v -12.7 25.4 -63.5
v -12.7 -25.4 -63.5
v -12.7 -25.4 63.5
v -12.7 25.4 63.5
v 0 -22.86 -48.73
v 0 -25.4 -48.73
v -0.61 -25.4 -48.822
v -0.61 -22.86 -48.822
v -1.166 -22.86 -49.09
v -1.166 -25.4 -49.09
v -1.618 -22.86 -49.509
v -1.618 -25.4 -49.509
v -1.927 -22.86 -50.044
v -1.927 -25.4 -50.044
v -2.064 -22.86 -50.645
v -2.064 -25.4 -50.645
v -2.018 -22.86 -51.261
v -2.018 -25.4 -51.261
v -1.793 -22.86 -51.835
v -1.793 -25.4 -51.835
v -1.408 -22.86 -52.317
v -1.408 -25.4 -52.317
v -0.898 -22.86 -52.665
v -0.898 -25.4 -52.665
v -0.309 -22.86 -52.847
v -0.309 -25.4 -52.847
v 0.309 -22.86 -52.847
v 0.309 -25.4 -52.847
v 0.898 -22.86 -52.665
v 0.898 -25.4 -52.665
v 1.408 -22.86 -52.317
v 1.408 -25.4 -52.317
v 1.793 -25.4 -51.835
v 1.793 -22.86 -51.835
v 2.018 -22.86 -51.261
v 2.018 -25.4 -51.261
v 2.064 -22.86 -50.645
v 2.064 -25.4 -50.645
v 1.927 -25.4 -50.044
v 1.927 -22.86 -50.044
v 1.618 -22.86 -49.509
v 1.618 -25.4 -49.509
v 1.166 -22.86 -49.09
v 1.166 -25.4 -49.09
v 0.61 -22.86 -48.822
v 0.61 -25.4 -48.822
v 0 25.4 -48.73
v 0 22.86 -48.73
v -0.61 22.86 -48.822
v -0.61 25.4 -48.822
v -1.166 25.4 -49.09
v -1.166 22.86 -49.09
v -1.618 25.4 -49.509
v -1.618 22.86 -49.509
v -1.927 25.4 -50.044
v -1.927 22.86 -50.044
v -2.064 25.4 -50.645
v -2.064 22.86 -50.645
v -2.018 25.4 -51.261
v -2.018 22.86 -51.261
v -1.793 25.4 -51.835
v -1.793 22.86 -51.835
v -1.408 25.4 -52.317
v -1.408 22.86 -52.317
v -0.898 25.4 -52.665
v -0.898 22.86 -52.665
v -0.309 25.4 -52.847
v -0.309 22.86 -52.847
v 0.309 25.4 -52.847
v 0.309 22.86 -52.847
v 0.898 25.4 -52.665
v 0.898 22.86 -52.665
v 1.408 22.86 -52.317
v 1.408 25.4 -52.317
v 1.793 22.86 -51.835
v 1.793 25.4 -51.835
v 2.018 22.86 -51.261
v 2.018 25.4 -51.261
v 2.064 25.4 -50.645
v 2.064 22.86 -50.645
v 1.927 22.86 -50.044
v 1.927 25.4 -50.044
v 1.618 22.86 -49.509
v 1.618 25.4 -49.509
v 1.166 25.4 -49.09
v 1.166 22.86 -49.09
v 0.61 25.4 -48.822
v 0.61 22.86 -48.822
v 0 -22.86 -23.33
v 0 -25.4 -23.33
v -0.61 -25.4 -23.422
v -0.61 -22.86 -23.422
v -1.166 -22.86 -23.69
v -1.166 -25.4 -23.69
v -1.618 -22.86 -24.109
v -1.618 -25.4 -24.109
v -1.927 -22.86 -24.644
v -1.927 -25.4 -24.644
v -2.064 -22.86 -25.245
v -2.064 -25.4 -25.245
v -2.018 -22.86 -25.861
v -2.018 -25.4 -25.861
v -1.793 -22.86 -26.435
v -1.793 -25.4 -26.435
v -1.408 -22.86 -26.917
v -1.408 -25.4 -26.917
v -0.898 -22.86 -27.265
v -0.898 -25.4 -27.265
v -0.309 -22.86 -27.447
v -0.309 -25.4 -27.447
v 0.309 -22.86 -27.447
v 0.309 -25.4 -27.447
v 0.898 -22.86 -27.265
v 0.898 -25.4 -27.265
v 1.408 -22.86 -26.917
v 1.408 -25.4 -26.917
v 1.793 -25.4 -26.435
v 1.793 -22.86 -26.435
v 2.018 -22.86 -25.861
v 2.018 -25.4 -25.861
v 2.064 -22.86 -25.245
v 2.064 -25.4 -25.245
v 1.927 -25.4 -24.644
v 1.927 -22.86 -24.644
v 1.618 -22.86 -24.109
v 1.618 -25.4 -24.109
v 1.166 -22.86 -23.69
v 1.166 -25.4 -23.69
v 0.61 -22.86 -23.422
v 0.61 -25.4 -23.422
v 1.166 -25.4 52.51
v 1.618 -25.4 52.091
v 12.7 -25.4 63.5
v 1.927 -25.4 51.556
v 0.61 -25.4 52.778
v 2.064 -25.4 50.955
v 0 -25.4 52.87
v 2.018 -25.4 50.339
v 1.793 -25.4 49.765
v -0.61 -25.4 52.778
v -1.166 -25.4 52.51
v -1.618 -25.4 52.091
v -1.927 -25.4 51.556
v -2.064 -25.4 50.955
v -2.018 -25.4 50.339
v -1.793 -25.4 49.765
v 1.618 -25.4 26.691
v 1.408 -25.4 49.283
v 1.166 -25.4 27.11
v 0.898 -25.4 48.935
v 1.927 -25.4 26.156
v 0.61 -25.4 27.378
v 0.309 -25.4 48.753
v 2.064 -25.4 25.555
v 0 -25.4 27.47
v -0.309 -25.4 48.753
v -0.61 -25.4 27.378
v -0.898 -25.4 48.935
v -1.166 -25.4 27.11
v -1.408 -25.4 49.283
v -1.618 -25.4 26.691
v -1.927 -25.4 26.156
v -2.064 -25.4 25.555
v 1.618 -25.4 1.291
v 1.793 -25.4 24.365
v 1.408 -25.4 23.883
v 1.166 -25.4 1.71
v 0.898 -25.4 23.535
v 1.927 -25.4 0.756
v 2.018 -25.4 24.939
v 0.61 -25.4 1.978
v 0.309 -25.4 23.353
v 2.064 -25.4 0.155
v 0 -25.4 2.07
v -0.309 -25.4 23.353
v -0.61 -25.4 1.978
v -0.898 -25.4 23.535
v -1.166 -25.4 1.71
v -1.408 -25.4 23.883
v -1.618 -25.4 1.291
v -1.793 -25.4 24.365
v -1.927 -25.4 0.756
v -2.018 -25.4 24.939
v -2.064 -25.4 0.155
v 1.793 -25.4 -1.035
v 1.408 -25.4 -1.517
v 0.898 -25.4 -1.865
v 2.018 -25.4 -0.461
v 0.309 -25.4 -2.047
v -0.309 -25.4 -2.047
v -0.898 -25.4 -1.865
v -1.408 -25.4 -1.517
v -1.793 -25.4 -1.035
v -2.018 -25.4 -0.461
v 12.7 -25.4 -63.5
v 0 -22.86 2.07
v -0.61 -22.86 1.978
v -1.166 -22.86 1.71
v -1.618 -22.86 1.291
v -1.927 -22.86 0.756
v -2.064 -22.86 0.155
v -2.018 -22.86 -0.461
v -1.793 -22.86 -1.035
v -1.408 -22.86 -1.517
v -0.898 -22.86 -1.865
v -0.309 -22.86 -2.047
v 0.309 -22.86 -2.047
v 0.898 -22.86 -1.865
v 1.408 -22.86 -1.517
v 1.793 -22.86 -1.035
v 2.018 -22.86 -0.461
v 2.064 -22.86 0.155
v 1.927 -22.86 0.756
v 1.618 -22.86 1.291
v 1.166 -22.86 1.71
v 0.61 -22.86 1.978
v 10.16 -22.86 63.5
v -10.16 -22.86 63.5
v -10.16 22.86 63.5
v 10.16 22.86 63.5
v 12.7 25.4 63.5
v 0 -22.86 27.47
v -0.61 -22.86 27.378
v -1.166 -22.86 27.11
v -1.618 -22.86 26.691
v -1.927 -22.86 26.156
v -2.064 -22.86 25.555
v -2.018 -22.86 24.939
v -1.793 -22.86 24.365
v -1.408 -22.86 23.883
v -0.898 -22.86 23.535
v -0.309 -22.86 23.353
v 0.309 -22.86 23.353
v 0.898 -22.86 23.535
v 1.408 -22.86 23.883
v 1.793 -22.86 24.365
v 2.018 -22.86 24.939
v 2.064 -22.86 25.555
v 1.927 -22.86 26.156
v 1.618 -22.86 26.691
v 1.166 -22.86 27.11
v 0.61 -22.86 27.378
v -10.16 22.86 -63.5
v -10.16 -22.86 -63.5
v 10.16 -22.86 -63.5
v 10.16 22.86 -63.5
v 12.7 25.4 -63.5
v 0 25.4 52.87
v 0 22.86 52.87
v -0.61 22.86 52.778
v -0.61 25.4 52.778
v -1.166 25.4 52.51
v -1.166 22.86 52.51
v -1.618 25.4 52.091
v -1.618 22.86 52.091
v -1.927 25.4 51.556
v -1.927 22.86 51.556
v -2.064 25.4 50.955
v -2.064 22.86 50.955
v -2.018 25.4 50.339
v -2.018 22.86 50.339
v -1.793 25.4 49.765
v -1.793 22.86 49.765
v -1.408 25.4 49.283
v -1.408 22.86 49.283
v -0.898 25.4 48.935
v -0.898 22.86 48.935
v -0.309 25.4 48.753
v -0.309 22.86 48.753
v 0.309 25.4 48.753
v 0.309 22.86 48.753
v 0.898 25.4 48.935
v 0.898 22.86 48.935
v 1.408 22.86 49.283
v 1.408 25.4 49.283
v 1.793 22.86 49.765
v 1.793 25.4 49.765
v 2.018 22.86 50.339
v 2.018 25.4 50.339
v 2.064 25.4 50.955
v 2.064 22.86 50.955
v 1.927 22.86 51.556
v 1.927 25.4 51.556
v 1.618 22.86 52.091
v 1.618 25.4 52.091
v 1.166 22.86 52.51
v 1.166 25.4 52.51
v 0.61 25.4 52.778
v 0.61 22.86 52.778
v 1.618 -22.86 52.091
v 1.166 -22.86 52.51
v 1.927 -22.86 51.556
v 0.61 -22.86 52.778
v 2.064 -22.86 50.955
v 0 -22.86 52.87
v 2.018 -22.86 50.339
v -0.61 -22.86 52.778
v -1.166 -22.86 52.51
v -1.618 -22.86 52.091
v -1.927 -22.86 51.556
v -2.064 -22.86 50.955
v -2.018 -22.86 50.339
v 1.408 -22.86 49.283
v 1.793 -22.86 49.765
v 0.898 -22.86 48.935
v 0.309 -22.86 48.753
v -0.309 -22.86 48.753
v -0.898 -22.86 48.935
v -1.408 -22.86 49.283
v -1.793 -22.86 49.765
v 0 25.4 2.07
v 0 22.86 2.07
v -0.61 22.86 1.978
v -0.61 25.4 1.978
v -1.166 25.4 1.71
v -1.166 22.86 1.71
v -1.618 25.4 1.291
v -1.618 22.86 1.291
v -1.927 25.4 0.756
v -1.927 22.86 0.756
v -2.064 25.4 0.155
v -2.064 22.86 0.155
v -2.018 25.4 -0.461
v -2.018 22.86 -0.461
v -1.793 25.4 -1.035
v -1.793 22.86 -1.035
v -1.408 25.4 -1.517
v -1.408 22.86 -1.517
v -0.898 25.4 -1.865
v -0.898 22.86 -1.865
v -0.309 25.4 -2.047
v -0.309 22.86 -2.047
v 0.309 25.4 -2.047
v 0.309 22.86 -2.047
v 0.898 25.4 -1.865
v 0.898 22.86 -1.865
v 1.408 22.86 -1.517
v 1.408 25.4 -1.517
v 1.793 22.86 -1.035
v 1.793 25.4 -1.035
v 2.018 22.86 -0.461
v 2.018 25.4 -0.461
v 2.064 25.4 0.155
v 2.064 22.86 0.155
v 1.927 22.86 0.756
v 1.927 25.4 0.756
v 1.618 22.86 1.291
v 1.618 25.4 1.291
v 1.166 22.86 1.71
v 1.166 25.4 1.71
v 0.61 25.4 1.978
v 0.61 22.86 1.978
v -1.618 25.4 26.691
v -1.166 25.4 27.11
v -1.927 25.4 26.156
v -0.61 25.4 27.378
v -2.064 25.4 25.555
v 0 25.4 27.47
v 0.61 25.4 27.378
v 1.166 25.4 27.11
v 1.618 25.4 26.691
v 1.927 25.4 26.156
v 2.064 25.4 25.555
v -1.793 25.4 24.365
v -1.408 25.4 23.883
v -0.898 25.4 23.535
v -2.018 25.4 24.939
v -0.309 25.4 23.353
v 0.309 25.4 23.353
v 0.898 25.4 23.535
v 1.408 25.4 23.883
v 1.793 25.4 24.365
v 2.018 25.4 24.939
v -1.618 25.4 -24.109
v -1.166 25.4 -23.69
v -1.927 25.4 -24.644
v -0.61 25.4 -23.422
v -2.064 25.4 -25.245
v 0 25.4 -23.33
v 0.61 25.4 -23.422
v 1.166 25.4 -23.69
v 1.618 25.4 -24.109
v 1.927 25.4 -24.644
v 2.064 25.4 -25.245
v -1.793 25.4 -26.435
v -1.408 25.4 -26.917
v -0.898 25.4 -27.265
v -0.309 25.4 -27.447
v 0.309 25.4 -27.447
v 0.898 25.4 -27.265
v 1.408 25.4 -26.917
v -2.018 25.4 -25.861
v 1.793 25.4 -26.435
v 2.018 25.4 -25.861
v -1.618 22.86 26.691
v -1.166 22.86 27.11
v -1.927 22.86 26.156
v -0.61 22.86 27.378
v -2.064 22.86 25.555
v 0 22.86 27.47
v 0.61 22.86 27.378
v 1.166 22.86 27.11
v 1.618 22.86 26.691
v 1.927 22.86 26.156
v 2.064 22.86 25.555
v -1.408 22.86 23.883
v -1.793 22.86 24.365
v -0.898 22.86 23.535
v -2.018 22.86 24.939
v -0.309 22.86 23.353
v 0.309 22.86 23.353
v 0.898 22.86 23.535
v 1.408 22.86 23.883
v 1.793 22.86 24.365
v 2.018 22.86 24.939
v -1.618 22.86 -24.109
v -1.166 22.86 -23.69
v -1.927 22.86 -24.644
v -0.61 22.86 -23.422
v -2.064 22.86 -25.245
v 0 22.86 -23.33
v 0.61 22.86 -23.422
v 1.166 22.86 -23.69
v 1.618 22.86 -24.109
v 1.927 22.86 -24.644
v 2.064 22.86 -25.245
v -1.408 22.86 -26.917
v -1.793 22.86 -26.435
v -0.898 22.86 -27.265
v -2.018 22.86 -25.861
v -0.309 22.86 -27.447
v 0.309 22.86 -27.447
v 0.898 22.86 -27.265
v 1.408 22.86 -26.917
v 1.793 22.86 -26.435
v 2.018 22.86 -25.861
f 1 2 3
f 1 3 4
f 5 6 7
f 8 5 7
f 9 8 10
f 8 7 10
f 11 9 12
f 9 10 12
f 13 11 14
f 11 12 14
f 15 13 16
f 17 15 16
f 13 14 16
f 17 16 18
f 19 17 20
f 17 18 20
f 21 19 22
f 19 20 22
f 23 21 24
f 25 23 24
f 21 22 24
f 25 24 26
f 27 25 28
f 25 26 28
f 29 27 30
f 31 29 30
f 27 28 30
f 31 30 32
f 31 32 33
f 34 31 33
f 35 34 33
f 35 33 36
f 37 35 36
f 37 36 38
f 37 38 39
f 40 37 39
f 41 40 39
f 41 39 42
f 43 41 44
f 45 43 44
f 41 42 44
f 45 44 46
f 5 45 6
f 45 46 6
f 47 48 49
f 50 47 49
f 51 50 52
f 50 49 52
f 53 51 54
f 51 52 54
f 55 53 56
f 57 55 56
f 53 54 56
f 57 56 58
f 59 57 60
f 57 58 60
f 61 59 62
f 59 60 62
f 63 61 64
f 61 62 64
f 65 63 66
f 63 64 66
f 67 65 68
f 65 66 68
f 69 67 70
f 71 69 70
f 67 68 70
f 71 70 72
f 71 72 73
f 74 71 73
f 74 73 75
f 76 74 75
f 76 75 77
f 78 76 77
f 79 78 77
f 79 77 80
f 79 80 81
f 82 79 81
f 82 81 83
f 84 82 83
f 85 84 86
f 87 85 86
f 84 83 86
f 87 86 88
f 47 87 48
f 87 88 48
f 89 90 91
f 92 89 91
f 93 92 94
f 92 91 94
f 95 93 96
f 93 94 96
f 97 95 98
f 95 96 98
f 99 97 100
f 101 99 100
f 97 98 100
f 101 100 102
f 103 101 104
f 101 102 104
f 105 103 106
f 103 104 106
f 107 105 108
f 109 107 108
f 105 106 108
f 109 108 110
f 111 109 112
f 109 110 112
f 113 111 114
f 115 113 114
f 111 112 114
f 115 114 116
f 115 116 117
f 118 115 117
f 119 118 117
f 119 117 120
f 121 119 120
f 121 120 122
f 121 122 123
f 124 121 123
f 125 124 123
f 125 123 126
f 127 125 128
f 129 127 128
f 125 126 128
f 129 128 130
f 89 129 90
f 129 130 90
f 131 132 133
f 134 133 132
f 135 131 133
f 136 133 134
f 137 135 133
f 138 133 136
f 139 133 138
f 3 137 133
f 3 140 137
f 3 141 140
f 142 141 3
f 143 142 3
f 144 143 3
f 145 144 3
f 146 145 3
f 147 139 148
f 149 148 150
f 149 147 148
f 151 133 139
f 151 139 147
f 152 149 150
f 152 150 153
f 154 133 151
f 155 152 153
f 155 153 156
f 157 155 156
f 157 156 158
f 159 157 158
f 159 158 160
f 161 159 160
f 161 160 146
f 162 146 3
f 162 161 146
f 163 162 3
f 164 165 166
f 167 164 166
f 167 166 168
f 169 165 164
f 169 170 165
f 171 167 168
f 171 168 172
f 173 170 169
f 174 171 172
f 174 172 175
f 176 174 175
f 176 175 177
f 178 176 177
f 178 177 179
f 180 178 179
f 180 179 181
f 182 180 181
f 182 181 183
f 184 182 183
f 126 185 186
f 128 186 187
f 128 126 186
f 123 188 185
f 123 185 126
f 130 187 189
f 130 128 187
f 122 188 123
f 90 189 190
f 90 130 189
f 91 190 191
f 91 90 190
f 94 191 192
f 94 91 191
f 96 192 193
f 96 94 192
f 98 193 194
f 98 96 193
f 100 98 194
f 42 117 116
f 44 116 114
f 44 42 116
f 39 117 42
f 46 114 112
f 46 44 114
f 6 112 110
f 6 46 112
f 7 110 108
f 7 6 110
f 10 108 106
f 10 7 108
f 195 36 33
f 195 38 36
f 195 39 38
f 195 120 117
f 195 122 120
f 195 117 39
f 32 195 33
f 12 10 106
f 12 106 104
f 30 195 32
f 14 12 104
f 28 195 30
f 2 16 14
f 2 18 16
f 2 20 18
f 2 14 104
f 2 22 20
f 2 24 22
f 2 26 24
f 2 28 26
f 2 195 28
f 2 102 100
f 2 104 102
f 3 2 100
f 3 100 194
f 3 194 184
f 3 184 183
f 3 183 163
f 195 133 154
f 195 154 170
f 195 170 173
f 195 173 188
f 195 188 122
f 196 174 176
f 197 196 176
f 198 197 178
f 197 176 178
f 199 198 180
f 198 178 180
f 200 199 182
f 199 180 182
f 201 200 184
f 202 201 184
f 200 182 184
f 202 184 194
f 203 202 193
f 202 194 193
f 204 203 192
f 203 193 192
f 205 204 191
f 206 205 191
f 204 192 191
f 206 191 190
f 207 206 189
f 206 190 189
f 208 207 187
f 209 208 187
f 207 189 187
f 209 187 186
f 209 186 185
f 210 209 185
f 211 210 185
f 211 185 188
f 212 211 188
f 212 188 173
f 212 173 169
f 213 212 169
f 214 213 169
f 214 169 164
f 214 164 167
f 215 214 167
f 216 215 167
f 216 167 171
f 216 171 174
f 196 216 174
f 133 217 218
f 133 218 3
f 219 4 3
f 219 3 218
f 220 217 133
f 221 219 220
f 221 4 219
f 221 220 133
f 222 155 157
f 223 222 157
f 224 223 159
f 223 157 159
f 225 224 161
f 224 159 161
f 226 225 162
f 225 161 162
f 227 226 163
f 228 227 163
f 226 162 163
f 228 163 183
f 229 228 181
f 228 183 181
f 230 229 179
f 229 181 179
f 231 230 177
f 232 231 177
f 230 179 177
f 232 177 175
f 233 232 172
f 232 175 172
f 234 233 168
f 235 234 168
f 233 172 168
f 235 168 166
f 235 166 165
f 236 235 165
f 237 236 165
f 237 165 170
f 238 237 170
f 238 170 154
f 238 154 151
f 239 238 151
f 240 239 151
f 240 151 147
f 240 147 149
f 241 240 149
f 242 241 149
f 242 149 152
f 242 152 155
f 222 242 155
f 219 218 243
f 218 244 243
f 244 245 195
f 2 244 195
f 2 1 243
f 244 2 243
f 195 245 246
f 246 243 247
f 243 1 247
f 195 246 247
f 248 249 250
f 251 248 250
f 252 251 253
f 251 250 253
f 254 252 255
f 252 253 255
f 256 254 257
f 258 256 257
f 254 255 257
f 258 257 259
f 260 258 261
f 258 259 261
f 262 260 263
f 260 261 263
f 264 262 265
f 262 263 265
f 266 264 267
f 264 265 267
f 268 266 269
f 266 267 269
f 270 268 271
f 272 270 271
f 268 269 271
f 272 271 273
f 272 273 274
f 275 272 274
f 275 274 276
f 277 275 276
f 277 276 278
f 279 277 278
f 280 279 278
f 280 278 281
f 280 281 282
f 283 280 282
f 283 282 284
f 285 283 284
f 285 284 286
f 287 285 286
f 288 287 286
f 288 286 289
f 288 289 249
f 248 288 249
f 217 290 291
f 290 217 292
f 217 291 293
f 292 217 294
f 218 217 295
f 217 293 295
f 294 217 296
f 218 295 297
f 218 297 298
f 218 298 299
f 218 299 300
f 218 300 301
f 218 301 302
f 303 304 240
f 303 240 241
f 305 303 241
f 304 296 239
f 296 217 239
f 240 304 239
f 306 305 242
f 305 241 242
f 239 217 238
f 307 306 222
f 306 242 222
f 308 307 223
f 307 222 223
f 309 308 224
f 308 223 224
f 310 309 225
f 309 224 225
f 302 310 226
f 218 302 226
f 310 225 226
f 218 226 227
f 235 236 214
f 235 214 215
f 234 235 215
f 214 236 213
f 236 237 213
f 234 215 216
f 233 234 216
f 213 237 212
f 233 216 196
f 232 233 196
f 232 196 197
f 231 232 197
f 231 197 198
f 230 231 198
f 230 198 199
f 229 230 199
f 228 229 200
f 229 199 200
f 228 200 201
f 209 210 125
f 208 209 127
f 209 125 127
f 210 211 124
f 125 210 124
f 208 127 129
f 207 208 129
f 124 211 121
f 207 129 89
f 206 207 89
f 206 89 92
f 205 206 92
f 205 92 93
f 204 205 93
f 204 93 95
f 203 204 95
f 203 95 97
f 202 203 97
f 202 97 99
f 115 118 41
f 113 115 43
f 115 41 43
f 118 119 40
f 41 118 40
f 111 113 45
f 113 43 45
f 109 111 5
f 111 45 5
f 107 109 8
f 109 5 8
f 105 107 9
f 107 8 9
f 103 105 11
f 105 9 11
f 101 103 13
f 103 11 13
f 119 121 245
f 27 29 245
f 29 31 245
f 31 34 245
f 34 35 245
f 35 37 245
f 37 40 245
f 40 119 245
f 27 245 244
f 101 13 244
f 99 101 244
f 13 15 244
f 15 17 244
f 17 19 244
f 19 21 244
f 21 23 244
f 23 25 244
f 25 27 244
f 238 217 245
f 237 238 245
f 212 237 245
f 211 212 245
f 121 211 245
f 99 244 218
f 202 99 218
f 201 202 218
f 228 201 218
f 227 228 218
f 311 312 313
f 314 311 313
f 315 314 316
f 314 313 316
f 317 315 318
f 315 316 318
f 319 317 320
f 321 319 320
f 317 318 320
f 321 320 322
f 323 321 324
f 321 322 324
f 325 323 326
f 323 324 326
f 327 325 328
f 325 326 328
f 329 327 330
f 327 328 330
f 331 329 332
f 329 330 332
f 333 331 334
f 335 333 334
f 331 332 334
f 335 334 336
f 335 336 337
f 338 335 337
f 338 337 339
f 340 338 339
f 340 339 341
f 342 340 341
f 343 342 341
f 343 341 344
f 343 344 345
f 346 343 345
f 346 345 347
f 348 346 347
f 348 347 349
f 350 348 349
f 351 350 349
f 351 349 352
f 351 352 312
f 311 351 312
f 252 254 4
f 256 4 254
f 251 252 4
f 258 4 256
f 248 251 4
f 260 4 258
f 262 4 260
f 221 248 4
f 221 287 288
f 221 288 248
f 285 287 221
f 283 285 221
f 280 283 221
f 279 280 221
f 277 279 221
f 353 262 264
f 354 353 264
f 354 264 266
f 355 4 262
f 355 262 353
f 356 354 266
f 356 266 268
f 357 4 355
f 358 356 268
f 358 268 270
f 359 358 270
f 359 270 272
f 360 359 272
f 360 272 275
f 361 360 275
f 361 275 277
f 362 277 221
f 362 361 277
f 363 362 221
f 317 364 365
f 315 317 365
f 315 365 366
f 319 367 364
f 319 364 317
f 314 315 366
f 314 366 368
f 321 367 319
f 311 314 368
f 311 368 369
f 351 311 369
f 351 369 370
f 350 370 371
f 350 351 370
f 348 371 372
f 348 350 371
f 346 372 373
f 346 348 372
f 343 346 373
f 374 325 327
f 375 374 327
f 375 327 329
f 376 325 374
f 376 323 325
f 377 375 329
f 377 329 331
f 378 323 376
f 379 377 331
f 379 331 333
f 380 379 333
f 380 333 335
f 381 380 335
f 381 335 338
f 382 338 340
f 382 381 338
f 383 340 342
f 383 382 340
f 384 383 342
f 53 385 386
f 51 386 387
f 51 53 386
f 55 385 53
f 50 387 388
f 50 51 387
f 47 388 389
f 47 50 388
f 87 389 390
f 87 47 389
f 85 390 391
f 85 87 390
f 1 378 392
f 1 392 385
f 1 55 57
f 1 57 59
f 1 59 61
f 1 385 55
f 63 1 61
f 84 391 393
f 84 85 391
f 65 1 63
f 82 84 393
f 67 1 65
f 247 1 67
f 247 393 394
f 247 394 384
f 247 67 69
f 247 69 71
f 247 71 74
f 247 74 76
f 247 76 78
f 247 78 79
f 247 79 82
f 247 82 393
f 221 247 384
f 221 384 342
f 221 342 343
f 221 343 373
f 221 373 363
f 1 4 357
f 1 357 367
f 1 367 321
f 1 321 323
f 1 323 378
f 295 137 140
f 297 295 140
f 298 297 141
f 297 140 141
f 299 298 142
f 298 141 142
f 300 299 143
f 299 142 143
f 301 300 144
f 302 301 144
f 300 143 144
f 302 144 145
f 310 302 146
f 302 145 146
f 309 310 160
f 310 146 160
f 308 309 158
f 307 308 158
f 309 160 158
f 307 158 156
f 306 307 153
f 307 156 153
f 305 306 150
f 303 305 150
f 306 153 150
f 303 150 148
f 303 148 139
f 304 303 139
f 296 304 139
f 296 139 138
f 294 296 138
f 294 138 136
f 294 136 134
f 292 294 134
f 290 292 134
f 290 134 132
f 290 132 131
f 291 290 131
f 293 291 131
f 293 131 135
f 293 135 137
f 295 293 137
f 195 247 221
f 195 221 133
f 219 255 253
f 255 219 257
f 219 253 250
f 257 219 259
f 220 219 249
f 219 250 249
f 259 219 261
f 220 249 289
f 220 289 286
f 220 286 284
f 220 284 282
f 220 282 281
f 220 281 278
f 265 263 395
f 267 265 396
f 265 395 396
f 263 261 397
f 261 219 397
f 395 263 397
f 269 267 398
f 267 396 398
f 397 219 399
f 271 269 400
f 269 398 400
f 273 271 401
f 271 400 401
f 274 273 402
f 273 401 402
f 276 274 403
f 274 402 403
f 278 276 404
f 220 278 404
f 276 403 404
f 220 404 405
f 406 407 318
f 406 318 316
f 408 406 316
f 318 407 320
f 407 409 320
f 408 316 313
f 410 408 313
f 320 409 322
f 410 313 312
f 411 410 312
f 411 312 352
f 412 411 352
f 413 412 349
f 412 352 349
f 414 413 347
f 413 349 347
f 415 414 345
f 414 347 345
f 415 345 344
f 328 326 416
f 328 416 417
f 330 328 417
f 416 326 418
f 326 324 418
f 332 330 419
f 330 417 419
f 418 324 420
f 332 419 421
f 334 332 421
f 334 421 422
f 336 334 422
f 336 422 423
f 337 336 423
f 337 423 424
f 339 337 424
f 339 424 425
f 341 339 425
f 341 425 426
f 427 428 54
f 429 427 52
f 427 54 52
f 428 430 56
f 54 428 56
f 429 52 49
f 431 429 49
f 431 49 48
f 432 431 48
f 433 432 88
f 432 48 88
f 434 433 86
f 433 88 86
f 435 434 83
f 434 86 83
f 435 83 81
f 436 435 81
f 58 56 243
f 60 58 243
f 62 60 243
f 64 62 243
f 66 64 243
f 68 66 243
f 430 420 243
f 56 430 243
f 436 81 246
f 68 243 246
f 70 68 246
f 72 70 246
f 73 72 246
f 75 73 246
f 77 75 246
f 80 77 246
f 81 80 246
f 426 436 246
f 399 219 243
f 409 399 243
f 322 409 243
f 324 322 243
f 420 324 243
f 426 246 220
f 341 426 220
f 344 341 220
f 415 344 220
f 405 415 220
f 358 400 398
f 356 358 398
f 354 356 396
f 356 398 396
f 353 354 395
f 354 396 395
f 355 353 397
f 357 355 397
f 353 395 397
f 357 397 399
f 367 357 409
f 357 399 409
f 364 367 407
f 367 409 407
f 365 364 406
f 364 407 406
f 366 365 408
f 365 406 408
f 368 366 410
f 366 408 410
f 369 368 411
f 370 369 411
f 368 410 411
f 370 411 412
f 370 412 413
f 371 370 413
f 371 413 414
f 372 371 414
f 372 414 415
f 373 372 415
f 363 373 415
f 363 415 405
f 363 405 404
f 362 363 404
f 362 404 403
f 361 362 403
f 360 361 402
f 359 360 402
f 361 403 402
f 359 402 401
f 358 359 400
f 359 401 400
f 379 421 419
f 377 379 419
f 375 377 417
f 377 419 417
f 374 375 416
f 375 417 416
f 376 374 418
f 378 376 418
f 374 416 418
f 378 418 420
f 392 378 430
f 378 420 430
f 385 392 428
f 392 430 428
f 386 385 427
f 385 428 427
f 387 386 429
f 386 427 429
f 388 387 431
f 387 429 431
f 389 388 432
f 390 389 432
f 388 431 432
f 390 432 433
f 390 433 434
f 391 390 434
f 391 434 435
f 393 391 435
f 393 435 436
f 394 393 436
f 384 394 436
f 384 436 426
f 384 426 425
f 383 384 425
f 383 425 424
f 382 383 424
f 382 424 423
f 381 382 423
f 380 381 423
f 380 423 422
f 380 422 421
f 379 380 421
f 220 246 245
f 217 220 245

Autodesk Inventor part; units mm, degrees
ref_plane "YZ Plane" through (0, 0, 0) normal (1, 0, 0) x (0, 1, 0)
ref_plane "XZ Plane" through (0, 0, 0) normal (0, 1, 0) x (-1, 0, 0)
ref_plane "XY Plane" through (0, 0, 0) normal (0, 0, 1) x (1, 0, 0)
sketch "Sketch1" plane through (0, 0, 0) normal (0, 0, 1) x (1, 0, 0)
  line L0 (12.7, -25.4) -> (-12.7, -25.4)
  line L1 (-12.7, -25.4) -> (-12.7, 25.4)
  line L2 (-12.7, 25.4) -> (12.7, 25.4)
  line L3 (12.7, 25.4) -> (12.7, -25.4)
  line L4 (12.7, -25.4) -> (-12.7, 25.4) construction
  line L5 (-12.7, -25.4) -> (12.7, 25.4) construction
  line L6 (10.16, -22.86) -> (-10.16, -22.86)
  line L7 (-10.16, -22.86) -> (-10.16, 22.86)
  line L8 (-10.16, 22.86) -> (10.16, 22.86)
  line L9 (10.16, 22.86) -> (10.16, -22.86)
  line L10 (10.16, -22.86) -> (-10.16, 22.86) construction
  line L11 (-10.16, -22.86) -> (10.16, 22.86) construction
  point P0 (0, 0)
  dimension "d0" = 25.4
  dimension "d1" = 50.8
  dimension "d2" = 20.32
  dimension "d3" = 45.72
extrude "Extrusion1" add sketch "Sketch1" along normal mid plane 127
sketch "Sketch2" plane through (-12.7, 25.4, 63.5) normal (0, 1, 0) x (1, 0, 0)
  line L0 (0, 0) -> (0, 127) projected
  line L1 (25.4, 0) -> (0, 0) projected
  point P0 (12.7, 63.5)
  point P1 (12.7, 12.7)
  dimension "d6" = 12.7
  dimension "d7" = 12.7
hole "Hole1" at (0, 25.4, 50.8) direction (0, -1, 0) diameter 4.1402 end through all
pattern_linear "Rectangular Pattern1" count 5 spacing 25.4 along (0, 0, -1) of "Hole1"
properties part number "Elevator_stationary_extender"
